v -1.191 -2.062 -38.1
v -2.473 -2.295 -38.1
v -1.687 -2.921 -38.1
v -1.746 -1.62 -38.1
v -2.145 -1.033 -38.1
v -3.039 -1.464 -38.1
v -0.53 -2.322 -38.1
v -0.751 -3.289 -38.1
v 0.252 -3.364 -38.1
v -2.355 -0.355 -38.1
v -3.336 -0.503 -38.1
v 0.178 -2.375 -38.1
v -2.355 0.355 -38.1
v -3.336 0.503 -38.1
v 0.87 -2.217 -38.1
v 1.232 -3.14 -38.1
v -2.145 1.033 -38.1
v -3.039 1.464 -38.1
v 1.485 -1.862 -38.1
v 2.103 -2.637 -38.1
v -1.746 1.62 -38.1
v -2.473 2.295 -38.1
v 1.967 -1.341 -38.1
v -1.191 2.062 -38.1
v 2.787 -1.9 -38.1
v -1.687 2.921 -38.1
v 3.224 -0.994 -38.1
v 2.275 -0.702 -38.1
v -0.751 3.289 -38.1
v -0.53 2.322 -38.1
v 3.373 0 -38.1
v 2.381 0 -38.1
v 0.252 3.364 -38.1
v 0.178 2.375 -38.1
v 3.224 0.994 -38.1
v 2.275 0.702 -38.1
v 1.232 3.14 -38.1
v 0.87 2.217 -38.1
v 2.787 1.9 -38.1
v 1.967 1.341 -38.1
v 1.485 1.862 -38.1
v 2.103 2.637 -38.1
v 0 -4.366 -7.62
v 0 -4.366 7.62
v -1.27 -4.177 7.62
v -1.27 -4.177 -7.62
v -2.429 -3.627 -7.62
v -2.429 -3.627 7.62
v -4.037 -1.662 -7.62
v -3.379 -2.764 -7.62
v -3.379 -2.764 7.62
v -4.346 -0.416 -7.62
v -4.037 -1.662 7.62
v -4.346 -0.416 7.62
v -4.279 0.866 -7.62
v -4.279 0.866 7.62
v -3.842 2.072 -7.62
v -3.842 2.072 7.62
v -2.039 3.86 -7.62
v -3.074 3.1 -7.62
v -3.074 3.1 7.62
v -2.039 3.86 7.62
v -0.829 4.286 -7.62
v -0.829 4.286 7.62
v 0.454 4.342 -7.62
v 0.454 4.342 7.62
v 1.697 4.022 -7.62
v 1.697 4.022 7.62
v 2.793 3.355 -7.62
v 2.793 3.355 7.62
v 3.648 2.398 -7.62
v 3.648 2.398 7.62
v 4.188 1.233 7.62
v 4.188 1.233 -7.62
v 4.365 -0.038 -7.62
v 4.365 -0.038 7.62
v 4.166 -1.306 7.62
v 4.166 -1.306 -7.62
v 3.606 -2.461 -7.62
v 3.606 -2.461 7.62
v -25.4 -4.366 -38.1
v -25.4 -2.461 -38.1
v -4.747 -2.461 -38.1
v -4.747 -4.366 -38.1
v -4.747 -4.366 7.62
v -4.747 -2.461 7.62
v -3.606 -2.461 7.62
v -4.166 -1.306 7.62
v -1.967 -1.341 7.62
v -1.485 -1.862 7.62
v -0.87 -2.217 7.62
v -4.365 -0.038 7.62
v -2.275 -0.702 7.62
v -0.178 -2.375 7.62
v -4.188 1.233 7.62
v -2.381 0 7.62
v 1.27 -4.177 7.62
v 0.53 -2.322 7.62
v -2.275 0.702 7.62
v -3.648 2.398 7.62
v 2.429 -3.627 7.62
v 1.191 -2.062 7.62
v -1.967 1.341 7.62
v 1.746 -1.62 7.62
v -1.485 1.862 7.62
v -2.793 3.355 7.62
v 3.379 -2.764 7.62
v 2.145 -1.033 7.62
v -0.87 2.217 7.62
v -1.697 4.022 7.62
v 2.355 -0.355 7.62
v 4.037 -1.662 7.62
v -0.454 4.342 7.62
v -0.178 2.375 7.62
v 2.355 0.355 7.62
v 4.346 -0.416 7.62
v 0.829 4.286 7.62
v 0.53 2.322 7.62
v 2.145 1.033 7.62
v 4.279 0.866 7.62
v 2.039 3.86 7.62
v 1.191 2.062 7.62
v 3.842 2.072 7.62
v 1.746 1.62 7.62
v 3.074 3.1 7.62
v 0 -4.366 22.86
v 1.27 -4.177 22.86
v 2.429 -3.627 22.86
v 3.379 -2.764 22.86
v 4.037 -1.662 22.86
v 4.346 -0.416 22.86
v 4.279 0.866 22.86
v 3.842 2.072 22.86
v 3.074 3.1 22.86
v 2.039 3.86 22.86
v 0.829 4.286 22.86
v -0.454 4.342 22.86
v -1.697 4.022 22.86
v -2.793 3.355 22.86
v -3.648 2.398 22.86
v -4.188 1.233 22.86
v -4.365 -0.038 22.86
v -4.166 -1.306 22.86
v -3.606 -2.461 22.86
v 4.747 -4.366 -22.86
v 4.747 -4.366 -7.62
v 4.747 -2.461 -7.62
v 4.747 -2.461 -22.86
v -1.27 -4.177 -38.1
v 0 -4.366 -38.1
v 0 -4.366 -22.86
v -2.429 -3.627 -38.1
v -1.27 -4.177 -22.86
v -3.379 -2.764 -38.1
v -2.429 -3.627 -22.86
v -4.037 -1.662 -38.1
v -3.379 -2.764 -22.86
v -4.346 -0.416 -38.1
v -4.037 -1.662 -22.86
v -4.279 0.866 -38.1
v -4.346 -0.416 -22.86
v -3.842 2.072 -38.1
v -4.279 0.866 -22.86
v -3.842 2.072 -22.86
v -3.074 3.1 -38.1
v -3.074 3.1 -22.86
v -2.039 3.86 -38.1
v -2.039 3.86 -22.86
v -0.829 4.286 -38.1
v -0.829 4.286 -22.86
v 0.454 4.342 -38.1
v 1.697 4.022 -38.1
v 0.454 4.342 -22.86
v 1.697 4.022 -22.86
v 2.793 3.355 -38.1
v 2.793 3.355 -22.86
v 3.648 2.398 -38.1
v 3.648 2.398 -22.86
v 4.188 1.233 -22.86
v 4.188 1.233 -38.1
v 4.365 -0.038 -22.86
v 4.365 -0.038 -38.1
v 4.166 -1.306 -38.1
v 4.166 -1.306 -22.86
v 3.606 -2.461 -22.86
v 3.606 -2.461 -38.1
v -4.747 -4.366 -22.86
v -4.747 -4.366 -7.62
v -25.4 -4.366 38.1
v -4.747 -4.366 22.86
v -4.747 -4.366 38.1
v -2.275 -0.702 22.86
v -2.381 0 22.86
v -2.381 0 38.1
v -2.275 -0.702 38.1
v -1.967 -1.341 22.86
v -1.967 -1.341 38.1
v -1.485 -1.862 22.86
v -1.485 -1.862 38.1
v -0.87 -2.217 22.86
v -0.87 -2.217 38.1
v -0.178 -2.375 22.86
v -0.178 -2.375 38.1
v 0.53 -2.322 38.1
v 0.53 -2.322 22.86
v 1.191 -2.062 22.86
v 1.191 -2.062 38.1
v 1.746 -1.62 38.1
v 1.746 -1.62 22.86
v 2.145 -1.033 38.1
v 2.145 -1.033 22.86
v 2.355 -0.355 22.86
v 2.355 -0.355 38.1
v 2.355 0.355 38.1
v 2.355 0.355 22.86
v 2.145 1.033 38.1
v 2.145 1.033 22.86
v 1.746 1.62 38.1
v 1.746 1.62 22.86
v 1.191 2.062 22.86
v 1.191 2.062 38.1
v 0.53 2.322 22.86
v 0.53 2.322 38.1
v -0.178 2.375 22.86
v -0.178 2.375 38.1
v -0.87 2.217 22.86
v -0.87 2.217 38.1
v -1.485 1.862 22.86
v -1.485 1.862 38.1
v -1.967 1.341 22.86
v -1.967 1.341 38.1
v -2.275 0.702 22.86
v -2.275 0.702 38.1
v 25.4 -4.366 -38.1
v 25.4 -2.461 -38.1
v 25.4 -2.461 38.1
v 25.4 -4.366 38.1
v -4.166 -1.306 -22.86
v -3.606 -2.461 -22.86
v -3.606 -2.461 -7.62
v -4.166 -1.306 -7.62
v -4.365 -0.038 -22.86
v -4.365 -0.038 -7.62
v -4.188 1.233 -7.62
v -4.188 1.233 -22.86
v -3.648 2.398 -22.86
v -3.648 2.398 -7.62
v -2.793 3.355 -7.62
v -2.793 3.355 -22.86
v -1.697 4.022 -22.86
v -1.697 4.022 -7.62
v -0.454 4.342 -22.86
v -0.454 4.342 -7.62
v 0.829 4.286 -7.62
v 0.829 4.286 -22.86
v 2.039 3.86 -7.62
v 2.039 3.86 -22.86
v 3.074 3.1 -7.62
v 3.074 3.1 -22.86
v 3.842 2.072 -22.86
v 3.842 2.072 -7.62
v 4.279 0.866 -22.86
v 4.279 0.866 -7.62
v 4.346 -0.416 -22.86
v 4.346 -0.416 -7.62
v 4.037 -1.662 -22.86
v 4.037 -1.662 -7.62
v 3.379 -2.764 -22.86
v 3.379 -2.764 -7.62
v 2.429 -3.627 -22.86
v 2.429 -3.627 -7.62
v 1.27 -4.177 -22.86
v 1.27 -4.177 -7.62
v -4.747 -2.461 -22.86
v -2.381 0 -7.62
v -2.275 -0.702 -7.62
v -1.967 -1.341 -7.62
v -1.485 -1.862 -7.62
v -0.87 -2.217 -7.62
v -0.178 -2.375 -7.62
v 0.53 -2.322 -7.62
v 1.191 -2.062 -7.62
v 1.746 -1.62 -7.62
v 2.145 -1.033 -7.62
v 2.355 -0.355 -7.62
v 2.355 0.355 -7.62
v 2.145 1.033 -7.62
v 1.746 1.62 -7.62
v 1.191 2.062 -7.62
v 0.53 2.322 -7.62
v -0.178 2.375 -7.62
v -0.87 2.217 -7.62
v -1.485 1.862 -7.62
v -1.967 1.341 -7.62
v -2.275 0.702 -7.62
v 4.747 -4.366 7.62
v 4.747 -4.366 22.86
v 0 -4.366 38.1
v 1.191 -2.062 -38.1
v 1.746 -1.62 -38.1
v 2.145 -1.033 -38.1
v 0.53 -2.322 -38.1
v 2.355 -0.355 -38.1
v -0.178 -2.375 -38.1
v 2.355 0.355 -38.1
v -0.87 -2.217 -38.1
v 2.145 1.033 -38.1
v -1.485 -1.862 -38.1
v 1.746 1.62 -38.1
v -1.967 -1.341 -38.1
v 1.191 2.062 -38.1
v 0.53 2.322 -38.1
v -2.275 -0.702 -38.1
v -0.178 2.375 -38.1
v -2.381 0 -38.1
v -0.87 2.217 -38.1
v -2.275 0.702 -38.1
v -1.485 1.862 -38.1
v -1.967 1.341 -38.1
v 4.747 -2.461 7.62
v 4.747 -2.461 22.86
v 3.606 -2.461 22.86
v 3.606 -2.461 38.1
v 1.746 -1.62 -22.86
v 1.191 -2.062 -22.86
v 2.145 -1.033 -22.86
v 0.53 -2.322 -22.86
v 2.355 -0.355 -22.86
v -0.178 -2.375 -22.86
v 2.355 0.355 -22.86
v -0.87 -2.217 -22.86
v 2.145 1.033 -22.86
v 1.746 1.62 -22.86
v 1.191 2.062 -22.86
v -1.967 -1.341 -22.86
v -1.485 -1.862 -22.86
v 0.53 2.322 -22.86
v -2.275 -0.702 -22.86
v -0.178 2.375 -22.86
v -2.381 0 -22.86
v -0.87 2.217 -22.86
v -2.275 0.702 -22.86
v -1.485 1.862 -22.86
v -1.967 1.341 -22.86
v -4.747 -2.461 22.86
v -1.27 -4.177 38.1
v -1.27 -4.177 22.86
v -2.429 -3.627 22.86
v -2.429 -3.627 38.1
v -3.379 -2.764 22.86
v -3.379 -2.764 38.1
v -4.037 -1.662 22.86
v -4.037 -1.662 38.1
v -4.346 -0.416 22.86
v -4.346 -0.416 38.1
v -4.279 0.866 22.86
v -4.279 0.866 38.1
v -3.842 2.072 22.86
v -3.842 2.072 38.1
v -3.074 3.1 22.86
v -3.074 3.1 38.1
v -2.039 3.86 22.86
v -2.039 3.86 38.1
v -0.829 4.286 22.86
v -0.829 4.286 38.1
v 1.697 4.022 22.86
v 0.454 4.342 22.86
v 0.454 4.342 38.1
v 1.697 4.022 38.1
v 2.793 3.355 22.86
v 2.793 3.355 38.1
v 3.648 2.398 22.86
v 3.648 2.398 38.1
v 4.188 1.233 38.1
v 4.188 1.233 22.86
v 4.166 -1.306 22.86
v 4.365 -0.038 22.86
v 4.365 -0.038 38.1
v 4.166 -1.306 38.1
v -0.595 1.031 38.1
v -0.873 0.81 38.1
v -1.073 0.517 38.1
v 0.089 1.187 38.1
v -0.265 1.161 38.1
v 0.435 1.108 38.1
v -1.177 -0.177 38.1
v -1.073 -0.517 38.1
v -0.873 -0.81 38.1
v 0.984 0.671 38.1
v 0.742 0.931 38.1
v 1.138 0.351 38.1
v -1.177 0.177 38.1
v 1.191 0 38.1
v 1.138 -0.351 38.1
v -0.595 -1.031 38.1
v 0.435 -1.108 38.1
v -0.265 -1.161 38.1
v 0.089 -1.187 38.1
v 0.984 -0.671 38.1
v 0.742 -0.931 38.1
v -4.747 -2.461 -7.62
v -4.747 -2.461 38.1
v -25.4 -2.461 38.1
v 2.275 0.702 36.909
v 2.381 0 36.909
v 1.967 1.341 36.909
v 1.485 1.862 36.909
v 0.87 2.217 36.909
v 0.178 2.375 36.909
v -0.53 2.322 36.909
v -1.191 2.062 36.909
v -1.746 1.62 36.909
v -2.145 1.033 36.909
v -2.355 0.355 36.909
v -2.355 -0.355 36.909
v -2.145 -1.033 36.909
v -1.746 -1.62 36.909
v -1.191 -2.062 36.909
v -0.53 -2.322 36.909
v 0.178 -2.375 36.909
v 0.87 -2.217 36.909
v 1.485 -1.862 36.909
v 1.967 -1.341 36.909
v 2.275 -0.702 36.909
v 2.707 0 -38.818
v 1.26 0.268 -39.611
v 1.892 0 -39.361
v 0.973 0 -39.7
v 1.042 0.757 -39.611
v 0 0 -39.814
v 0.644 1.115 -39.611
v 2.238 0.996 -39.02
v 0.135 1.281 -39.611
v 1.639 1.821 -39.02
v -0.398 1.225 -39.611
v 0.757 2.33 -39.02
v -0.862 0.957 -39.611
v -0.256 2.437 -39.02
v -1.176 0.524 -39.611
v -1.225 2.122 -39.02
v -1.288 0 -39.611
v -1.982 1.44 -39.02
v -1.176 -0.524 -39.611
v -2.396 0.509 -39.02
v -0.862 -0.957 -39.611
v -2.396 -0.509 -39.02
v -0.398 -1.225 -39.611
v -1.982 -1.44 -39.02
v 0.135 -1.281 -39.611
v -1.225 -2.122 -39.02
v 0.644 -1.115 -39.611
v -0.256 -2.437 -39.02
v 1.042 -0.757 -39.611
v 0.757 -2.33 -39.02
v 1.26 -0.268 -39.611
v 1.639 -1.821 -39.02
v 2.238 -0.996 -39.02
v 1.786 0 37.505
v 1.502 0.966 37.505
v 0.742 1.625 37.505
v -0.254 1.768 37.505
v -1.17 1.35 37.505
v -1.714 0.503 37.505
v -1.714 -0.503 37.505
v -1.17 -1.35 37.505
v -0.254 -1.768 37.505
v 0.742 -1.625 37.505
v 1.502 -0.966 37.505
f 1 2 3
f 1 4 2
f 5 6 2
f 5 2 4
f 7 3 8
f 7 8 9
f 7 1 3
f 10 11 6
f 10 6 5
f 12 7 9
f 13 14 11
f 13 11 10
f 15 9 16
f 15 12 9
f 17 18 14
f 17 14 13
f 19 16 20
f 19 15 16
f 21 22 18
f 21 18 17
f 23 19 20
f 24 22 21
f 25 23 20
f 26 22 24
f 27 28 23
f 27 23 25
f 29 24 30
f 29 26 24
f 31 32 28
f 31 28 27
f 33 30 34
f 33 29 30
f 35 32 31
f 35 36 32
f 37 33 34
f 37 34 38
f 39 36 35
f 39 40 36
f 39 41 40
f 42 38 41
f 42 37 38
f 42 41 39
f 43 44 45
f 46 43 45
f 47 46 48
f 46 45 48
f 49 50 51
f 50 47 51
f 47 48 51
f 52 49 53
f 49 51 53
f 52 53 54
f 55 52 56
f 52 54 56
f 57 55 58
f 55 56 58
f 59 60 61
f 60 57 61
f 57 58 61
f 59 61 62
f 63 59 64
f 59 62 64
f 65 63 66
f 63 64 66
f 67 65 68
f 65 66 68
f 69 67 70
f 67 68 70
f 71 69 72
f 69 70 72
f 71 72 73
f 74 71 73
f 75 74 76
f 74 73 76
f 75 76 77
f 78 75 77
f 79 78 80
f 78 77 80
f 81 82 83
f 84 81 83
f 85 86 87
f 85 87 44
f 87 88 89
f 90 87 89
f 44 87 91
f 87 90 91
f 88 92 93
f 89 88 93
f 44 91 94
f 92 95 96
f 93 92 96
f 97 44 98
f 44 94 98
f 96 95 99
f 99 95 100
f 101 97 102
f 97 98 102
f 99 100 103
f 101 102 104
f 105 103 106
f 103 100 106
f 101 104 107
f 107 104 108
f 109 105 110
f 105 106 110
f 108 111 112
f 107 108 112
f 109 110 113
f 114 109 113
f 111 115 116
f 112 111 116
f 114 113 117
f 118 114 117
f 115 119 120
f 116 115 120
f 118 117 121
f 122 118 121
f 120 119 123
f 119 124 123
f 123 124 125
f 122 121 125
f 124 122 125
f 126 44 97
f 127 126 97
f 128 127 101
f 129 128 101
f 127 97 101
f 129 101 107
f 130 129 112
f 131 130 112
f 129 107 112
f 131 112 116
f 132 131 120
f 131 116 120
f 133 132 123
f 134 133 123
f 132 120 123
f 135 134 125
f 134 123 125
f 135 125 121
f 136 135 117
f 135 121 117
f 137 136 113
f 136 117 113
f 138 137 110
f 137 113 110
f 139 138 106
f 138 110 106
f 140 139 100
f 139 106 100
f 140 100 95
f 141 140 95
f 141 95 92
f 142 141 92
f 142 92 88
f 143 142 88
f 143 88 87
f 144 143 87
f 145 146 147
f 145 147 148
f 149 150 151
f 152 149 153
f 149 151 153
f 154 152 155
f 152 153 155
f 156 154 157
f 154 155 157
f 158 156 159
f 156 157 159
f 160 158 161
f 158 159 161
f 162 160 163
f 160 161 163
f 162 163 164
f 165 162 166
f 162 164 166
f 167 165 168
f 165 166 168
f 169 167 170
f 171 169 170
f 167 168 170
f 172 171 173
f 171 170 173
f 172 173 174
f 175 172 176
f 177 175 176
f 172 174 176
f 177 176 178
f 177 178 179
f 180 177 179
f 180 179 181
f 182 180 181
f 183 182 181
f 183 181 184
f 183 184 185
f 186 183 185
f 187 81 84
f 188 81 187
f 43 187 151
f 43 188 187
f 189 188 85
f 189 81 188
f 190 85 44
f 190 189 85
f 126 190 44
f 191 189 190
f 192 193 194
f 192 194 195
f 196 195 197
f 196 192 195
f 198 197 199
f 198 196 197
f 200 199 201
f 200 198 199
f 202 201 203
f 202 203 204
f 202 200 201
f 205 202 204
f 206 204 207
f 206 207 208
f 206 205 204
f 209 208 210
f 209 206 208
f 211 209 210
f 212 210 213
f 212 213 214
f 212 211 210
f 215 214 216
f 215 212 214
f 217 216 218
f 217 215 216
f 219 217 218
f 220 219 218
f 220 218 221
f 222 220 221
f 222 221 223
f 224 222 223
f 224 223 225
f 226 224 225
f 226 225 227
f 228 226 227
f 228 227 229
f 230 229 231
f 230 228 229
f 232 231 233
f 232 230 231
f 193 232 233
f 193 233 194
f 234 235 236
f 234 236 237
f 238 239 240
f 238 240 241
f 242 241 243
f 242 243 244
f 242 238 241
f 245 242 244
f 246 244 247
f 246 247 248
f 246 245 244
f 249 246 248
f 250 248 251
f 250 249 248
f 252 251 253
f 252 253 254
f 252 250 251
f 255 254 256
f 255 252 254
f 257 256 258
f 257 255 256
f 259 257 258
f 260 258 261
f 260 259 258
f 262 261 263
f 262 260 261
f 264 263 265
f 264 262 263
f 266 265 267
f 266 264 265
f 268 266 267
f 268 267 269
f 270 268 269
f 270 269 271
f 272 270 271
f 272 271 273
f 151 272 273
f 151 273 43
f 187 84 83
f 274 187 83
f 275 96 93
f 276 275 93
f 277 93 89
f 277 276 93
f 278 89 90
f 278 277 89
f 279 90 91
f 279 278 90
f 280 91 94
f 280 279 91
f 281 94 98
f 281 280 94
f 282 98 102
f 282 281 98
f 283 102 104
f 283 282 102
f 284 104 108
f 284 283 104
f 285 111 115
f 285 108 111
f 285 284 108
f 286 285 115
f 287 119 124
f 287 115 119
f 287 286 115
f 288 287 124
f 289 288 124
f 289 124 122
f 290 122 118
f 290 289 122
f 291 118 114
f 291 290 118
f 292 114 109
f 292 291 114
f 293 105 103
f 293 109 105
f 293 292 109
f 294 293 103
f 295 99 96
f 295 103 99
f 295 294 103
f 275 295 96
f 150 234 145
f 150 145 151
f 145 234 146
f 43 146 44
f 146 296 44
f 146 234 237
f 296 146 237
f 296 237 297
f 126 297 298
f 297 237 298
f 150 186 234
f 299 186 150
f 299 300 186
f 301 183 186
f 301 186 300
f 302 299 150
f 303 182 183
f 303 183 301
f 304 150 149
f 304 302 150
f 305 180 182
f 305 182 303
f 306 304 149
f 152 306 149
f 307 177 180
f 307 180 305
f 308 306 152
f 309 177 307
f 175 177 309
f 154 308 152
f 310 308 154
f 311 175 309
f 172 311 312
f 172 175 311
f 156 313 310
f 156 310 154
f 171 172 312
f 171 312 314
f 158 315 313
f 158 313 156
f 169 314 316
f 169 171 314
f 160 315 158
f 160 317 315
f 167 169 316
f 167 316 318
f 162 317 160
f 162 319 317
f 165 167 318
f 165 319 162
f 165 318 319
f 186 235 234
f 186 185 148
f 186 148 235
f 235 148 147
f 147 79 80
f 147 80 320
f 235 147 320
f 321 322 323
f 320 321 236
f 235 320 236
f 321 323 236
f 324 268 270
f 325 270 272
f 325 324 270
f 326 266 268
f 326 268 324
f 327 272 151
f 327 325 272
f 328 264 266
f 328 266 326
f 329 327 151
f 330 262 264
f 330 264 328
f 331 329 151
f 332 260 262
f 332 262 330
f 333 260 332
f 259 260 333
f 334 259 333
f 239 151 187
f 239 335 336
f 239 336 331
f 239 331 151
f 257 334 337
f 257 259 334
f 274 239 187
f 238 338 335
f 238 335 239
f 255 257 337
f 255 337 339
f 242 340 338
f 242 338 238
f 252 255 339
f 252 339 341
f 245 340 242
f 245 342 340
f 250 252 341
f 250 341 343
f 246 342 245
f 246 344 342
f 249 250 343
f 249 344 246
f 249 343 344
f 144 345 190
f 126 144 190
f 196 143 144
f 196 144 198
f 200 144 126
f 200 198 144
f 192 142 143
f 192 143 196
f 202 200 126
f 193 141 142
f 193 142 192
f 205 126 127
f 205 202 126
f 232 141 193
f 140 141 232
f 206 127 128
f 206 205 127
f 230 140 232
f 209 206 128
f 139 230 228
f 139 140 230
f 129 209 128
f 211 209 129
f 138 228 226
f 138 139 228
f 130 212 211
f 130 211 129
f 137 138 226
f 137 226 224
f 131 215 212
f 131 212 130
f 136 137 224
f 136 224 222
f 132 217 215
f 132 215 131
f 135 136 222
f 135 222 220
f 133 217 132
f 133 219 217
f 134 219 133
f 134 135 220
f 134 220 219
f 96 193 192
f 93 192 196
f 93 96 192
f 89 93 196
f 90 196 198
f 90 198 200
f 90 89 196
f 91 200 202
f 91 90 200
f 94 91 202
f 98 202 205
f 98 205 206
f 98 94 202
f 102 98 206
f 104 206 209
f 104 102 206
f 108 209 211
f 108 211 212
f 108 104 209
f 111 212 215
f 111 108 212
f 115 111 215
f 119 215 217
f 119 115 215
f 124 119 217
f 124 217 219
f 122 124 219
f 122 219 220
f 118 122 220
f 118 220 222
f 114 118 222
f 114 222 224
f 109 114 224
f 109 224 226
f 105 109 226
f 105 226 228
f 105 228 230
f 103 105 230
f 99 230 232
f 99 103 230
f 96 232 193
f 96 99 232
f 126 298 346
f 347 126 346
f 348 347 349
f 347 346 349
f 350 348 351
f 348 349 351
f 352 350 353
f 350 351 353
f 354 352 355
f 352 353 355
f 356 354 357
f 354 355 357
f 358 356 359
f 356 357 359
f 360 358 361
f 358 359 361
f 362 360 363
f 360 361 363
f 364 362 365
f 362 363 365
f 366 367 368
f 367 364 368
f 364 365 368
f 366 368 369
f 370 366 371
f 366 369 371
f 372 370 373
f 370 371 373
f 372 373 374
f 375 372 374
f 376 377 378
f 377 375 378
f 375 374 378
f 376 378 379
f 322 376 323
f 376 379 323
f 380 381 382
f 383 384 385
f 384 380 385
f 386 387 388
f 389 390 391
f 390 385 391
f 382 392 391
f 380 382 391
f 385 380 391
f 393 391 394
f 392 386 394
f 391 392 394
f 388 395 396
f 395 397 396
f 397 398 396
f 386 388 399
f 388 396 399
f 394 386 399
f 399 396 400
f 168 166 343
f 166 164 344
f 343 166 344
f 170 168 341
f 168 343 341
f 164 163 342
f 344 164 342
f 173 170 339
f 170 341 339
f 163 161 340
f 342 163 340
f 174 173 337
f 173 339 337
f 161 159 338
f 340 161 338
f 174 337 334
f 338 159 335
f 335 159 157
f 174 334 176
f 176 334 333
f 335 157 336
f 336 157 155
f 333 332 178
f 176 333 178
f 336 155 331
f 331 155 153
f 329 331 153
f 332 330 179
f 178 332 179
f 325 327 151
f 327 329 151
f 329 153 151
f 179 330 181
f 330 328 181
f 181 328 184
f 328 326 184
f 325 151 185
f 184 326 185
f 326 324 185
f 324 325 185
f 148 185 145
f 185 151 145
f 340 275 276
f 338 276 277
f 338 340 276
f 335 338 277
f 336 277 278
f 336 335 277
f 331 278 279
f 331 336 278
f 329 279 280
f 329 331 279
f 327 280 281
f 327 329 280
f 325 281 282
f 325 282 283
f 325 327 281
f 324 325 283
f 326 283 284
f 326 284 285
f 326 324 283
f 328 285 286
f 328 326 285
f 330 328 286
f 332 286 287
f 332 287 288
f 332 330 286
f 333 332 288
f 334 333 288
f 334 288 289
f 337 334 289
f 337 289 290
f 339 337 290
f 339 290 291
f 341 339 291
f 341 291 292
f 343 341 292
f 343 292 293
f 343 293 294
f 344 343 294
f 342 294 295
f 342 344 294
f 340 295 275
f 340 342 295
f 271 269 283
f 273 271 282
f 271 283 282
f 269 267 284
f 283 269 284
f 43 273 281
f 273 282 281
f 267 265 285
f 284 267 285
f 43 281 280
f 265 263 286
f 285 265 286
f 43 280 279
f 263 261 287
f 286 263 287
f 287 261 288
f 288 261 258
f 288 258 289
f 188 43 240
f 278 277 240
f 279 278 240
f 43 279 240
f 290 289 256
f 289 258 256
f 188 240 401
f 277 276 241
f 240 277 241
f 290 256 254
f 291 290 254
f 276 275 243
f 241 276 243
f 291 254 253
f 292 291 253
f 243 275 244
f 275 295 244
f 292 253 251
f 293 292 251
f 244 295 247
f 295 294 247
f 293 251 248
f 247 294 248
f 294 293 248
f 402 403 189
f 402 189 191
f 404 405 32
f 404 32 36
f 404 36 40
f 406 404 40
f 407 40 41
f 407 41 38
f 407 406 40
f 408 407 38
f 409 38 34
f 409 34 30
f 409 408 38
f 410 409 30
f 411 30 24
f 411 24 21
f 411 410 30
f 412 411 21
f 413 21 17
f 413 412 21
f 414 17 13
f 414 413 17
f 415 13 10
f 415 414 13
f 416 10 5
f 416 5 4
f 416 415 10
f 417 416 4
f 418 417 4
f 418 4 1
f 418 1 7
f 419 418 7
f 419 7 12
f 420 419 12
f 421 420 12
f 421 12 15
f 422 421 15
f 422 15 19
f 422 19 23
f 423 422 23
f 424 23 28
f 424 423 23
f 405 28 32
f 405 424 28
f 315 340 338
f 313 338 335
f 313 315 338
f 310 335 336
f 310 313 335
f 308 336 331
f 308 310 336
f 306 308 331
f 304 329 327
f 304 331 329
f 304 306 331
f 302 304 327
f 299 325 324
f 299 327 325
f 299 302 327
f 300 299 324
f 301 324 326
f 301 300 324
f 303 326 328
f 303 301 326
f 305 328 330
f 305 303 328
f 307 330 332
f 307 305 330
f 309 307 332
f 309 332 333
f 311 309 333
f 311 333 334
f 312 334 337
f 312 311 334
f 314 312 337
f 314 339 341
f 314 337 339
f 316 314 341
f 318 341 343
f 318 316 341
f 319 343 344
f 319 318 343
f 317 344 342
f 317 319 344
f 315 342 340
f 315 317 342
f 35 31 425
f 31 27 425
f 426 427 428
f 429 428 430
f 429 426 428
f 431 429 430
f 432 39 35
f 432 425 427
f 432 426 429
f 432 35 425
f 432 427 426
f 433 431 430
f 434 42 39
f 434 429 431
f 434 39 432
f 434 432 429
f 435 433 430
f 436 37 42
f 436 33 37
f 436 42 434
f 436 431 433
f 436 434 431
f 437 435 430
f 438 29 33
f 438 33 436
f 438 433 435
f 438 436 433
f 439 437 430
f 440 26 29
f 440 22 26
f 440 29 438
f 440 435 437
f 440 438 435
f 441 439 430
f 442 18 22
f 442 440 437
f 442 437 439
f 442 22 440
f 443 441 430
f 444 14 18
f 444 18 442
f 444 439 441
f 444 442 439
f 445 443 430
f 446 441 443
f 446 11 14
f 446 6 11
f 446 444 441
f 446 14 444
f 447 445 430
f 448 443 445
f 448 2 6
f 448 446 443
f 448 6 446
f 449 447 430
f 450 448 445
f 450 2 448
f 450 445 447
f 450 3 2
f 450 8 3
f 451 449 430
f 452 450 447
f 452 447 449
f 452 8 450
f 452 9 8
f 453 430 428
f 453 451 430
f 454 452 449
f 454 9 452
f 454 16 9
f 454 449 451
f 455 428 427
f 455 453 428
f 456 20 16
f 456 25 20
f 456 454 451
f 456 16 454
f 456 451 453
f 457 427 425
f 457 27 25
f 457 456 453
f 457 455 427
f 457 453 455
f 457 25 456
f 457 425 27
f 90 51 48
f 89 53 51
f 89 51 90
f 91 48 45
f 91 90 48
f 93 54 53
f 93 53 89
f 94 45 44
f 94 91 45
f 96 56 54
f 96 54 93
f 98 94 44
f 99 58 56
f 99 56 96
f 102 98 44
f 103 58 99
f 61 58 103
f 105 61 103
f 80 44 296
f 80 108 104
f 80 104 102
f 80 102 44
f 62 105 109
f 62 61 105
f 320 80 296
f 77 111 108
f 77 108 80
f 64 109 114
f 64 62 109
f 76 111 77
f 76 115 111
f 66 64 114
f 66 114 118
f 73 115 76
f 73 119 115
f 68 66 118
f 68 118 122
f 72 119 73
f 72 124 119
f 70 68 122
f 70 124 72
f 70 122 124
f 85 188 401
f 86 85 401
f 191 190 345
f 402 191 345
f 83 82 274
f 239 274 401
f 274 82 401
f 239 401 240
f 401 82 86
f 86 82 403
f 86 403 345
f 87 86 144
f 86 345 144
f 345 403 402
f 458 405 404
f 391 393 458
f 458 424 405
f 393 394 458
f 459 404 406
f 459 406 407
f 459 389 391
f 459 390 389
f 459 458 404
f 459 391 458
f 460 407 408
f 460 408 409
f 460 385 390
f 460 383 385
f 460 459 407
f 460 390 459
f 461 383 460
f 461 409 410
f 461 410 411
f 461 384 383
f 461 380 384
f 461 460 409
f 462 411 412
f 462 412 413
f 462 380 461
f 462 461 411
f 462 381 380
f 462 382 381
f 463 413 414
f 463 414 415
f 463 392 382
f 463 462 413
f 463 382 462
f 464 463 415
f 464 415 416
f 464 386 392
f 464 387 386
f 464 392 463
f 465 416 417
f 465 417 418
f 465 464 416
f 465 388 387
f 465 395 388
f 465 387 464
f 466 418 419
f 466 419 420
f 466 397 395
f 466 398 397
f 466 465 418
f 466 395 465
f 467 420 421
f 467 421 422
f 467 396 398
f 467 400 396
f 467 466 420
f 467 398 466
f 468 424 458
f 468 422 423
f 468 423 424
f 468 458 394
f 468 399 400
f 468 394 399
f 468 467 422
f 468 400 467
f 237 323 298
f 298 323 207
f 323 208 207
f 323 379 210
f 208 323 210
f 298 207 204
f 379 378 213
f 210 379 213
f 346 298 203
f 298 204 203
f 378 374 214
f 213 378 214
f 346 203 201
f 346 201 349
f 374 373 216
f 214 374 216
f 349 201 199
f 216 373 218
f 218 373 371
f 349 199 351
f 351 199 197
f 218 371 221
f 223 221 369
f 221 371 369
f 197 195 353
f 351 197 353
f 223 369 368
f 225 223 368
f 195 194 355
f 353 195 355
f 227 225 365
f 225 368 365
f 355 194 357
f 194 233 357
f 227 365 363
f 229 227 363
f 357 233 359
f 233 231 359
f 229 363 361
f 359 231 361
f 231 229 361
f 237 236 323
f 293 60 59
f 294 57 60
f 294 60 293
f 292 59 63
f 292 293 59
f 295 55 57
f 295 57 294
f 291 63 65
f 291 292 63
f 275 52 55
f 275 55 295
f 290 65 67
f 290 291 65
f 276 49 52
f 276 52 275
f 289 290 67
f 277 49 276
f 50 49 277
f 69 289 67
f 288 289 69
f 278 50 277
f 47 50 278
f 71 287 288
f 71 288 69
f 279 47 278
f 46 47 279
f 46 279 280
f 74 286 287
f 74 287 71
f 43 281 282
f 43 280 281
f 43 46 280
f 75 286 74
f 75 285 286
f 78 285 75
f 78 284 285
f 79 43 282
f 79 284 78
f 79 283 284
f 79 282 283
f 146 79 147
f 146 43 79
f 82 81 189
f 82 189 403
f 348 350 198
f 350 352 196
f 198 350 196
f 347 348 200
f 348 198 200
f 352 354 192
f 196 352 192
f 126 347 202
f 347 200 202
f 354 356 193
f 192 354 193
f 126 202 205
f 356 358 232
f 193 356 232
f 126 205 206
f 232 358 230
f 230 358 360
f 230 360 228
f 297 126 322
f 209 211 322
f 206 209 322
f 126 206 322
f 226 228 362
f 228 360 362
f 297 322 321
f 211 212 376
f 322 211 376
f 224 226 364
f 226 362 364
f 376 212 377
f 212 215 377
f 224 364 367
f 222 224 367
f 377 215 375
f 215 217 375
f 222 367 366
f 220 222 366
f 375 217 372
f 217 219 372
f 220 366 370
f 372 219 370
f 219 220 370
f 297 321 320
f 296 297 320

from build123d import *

# Parameters (mm, degrees)
SKETCH1_R            = 2.38125
EXTRUDE1_DEPTH       = 38.1
SKETCH1_W            = 20.653375
SKETCH1_H            = 1.905
EXTRUDE1_2_DEPTH     = 38.1
SKETCH3_W            = 9.49325
SKETCH3_H            = 15.24
CUT_EXTRUDE1_DEPTH   = 38.1
SKETCH4_R            = 2.38125
EXTRUDE2_DEPTH       = 15.24
SKETCH5_R            = 2.38125
EXTRUDE3_DEPTH       = 15.24
EXTRUDE23_DEPTH      = 48.427977944
EXTRUDE23_DEPTH_BACK = 48.427977944
SKETCH19_W           = 50.8
SKETCH19_H           = 1.7145
CHAMFER1_SIZE        = 1.190625


with BuildPart() as part:
    # Sketch1 → Extrude1 (new, symmetric)
    with BuildSketch(Plane.XY):
        with BuildLine():
            Line((25.4, -4.365625), (0, -4.365625))
            ThreePointArc((0, -4.365625), (-2.039180672, 3.860106712), (3.6061068, -2.460625))
            Line((3.6061068, -2.460625), (25.4, -2.460625))
            Line((25.4, -2.460625), (25.4, -4.365625))
        make_face()
        with Locations(Location((0, 0, 0), (0, 0, 180))):
            Circle(SKETCH1_R, mode=Mode.SUBTRACT)
    extrude(amount=EXTRUDE1_DEPTH, both=True)

    # Sketch3 → Cut-Extrude1 (cut, symmetric)
    with BuildSketch(Plane(origin=(0, 0, 0), x_dir=(1, 0, 0), z_dir=(0, 1, 0))):
        with Locations((0, 15.24)):
            Rectangle(SKETCH3_W, SKETCH3_H)
        with Locations((0, -15.24)):
            Rectangle(SKETCH3_W, SKETCH3_H)
    extrude(amount=CUT_EXTRUDE1_DEPTH, both=True, mode=Mode.SUBTRACT)


with BuildPart() as body_2:
    # Sketch1 → Extrude1 2 (new, symmetric)
    with BuildSketch(Plane.XY):
        with Locations((-15.0733125, -3.413125)):
            Rectangle(SKETCH1_W, SKETCH1_H)
    extrude(amount=EXTRUDE1_2_DEPTH, both=True)

    # Sketch4 → Extrude2 (add)
    with BuildSketch(Plane.XY.offset(-22.86)):
        with BuildLine():
            Line((-4.746625, -2.460625), (-3.6061068, -2.460625))
            ThreePointArc((-3.6061068, -2.460625), (2.039180672, 3.860106712), (0, -4.365625))
            Line((0, -4.365625), (-4.746625, -4.365625))
            Line((-4.746625, -4.365625), (-4.746625, -2.460625))
        make_face()
        with Locations(Location((0, 0, 0), (0, 0, 180))):
            Circle(SKETCH4_R, mode=Mode.SUBTRACT)
    extrude(amount=EXTRUDE2_DEPTH)

    # Sketch5 → Extrude3 (add)
    with BuildSketch(Plane.XY.offset(7.62)):
        with BuildLine():
            Line((-3.6061068, -2.460625), (-4.746625, -2.460625))
            Line((-4.746625, -2.460625), (-4.746625, -4.365625))
            Line((-4.746625, -4.365625), (0, -4.365625))
            ThreePointArc((0, -4.365625), (2.039180672, 3.860106712), (-3.6061068, -2.460625))
        make_face()
        with Locations(Location((0, 0, 0), (0, 0, 180))):
            Circle(SKETCH5_R, mode=Mode.SUBTRACT)
    extrude(amount=EXTRUDE3_DEPTH)


with BuildPart() as body_3:
    # Sketch6 → Revolve1 (revolve)
    with BuildSketch(Plane(origin=(0, 0, 0), x_dir=(1, 0, 0), z_dir=(0, 1, 0)), mode=Mode.PRIVATE) as revolve1_sk:
        with BuildLine():
            Line((-3.3734375, 38.1), (-2.38125, 38.1))
            Line((-2.38125, 38.1), (-2.38125, -38.1))
            Line((-2.38125, -38.1), (-3.3734375, -38.1))
            ThreePointArc((-3.3734375, -38.1), (-1.89206176, -39.361281386), (0, -39.8145))
            Line((0, -39.8145), (0, 39.8145))
            ThreePointArc((0, 39.8145), (-1.89206176, 39.361281386), (-3.3734375, 38.1))
        make_face()
    revolve(revolve1_sk.sketch.rotate(Axis((0, 0, -39.8145), (0, 0, 1)), 180), axis=Axis((0, 0, -39.8145), (0, 0, 1)))

    # Sketch19 → Extrude23 (cut, two sides: drawn at the far end of the back side and taken through both)
    with BuildSketch(Plane(origin=(0, 0, 0), x_dir=(1, 0, 0), z_dir=(0, 1, 0)).offset(-EXTRUDE23_DEPTH_BACK)):
        with Locations((0, -38.95725)):
            Rectangle(SKETCH19_W, SKETCH19_H)
    extrude(amount=EXTRUDE23_DEPTH + EXTRUDE23_DEPTH_BACK, mode=Mode.SUBTRACT)

    # Chamfer1
    chamfer1_edges = [body_3.edges().sort_by_distance(p)[0] for p in [
        (-2.38125, 0, 38.1),
    ]]
    chamfer(chamfer1_edges, length=CHAMFER1_SIZE)


solid = Compound([part.part, body_2.part, body_3.part])
